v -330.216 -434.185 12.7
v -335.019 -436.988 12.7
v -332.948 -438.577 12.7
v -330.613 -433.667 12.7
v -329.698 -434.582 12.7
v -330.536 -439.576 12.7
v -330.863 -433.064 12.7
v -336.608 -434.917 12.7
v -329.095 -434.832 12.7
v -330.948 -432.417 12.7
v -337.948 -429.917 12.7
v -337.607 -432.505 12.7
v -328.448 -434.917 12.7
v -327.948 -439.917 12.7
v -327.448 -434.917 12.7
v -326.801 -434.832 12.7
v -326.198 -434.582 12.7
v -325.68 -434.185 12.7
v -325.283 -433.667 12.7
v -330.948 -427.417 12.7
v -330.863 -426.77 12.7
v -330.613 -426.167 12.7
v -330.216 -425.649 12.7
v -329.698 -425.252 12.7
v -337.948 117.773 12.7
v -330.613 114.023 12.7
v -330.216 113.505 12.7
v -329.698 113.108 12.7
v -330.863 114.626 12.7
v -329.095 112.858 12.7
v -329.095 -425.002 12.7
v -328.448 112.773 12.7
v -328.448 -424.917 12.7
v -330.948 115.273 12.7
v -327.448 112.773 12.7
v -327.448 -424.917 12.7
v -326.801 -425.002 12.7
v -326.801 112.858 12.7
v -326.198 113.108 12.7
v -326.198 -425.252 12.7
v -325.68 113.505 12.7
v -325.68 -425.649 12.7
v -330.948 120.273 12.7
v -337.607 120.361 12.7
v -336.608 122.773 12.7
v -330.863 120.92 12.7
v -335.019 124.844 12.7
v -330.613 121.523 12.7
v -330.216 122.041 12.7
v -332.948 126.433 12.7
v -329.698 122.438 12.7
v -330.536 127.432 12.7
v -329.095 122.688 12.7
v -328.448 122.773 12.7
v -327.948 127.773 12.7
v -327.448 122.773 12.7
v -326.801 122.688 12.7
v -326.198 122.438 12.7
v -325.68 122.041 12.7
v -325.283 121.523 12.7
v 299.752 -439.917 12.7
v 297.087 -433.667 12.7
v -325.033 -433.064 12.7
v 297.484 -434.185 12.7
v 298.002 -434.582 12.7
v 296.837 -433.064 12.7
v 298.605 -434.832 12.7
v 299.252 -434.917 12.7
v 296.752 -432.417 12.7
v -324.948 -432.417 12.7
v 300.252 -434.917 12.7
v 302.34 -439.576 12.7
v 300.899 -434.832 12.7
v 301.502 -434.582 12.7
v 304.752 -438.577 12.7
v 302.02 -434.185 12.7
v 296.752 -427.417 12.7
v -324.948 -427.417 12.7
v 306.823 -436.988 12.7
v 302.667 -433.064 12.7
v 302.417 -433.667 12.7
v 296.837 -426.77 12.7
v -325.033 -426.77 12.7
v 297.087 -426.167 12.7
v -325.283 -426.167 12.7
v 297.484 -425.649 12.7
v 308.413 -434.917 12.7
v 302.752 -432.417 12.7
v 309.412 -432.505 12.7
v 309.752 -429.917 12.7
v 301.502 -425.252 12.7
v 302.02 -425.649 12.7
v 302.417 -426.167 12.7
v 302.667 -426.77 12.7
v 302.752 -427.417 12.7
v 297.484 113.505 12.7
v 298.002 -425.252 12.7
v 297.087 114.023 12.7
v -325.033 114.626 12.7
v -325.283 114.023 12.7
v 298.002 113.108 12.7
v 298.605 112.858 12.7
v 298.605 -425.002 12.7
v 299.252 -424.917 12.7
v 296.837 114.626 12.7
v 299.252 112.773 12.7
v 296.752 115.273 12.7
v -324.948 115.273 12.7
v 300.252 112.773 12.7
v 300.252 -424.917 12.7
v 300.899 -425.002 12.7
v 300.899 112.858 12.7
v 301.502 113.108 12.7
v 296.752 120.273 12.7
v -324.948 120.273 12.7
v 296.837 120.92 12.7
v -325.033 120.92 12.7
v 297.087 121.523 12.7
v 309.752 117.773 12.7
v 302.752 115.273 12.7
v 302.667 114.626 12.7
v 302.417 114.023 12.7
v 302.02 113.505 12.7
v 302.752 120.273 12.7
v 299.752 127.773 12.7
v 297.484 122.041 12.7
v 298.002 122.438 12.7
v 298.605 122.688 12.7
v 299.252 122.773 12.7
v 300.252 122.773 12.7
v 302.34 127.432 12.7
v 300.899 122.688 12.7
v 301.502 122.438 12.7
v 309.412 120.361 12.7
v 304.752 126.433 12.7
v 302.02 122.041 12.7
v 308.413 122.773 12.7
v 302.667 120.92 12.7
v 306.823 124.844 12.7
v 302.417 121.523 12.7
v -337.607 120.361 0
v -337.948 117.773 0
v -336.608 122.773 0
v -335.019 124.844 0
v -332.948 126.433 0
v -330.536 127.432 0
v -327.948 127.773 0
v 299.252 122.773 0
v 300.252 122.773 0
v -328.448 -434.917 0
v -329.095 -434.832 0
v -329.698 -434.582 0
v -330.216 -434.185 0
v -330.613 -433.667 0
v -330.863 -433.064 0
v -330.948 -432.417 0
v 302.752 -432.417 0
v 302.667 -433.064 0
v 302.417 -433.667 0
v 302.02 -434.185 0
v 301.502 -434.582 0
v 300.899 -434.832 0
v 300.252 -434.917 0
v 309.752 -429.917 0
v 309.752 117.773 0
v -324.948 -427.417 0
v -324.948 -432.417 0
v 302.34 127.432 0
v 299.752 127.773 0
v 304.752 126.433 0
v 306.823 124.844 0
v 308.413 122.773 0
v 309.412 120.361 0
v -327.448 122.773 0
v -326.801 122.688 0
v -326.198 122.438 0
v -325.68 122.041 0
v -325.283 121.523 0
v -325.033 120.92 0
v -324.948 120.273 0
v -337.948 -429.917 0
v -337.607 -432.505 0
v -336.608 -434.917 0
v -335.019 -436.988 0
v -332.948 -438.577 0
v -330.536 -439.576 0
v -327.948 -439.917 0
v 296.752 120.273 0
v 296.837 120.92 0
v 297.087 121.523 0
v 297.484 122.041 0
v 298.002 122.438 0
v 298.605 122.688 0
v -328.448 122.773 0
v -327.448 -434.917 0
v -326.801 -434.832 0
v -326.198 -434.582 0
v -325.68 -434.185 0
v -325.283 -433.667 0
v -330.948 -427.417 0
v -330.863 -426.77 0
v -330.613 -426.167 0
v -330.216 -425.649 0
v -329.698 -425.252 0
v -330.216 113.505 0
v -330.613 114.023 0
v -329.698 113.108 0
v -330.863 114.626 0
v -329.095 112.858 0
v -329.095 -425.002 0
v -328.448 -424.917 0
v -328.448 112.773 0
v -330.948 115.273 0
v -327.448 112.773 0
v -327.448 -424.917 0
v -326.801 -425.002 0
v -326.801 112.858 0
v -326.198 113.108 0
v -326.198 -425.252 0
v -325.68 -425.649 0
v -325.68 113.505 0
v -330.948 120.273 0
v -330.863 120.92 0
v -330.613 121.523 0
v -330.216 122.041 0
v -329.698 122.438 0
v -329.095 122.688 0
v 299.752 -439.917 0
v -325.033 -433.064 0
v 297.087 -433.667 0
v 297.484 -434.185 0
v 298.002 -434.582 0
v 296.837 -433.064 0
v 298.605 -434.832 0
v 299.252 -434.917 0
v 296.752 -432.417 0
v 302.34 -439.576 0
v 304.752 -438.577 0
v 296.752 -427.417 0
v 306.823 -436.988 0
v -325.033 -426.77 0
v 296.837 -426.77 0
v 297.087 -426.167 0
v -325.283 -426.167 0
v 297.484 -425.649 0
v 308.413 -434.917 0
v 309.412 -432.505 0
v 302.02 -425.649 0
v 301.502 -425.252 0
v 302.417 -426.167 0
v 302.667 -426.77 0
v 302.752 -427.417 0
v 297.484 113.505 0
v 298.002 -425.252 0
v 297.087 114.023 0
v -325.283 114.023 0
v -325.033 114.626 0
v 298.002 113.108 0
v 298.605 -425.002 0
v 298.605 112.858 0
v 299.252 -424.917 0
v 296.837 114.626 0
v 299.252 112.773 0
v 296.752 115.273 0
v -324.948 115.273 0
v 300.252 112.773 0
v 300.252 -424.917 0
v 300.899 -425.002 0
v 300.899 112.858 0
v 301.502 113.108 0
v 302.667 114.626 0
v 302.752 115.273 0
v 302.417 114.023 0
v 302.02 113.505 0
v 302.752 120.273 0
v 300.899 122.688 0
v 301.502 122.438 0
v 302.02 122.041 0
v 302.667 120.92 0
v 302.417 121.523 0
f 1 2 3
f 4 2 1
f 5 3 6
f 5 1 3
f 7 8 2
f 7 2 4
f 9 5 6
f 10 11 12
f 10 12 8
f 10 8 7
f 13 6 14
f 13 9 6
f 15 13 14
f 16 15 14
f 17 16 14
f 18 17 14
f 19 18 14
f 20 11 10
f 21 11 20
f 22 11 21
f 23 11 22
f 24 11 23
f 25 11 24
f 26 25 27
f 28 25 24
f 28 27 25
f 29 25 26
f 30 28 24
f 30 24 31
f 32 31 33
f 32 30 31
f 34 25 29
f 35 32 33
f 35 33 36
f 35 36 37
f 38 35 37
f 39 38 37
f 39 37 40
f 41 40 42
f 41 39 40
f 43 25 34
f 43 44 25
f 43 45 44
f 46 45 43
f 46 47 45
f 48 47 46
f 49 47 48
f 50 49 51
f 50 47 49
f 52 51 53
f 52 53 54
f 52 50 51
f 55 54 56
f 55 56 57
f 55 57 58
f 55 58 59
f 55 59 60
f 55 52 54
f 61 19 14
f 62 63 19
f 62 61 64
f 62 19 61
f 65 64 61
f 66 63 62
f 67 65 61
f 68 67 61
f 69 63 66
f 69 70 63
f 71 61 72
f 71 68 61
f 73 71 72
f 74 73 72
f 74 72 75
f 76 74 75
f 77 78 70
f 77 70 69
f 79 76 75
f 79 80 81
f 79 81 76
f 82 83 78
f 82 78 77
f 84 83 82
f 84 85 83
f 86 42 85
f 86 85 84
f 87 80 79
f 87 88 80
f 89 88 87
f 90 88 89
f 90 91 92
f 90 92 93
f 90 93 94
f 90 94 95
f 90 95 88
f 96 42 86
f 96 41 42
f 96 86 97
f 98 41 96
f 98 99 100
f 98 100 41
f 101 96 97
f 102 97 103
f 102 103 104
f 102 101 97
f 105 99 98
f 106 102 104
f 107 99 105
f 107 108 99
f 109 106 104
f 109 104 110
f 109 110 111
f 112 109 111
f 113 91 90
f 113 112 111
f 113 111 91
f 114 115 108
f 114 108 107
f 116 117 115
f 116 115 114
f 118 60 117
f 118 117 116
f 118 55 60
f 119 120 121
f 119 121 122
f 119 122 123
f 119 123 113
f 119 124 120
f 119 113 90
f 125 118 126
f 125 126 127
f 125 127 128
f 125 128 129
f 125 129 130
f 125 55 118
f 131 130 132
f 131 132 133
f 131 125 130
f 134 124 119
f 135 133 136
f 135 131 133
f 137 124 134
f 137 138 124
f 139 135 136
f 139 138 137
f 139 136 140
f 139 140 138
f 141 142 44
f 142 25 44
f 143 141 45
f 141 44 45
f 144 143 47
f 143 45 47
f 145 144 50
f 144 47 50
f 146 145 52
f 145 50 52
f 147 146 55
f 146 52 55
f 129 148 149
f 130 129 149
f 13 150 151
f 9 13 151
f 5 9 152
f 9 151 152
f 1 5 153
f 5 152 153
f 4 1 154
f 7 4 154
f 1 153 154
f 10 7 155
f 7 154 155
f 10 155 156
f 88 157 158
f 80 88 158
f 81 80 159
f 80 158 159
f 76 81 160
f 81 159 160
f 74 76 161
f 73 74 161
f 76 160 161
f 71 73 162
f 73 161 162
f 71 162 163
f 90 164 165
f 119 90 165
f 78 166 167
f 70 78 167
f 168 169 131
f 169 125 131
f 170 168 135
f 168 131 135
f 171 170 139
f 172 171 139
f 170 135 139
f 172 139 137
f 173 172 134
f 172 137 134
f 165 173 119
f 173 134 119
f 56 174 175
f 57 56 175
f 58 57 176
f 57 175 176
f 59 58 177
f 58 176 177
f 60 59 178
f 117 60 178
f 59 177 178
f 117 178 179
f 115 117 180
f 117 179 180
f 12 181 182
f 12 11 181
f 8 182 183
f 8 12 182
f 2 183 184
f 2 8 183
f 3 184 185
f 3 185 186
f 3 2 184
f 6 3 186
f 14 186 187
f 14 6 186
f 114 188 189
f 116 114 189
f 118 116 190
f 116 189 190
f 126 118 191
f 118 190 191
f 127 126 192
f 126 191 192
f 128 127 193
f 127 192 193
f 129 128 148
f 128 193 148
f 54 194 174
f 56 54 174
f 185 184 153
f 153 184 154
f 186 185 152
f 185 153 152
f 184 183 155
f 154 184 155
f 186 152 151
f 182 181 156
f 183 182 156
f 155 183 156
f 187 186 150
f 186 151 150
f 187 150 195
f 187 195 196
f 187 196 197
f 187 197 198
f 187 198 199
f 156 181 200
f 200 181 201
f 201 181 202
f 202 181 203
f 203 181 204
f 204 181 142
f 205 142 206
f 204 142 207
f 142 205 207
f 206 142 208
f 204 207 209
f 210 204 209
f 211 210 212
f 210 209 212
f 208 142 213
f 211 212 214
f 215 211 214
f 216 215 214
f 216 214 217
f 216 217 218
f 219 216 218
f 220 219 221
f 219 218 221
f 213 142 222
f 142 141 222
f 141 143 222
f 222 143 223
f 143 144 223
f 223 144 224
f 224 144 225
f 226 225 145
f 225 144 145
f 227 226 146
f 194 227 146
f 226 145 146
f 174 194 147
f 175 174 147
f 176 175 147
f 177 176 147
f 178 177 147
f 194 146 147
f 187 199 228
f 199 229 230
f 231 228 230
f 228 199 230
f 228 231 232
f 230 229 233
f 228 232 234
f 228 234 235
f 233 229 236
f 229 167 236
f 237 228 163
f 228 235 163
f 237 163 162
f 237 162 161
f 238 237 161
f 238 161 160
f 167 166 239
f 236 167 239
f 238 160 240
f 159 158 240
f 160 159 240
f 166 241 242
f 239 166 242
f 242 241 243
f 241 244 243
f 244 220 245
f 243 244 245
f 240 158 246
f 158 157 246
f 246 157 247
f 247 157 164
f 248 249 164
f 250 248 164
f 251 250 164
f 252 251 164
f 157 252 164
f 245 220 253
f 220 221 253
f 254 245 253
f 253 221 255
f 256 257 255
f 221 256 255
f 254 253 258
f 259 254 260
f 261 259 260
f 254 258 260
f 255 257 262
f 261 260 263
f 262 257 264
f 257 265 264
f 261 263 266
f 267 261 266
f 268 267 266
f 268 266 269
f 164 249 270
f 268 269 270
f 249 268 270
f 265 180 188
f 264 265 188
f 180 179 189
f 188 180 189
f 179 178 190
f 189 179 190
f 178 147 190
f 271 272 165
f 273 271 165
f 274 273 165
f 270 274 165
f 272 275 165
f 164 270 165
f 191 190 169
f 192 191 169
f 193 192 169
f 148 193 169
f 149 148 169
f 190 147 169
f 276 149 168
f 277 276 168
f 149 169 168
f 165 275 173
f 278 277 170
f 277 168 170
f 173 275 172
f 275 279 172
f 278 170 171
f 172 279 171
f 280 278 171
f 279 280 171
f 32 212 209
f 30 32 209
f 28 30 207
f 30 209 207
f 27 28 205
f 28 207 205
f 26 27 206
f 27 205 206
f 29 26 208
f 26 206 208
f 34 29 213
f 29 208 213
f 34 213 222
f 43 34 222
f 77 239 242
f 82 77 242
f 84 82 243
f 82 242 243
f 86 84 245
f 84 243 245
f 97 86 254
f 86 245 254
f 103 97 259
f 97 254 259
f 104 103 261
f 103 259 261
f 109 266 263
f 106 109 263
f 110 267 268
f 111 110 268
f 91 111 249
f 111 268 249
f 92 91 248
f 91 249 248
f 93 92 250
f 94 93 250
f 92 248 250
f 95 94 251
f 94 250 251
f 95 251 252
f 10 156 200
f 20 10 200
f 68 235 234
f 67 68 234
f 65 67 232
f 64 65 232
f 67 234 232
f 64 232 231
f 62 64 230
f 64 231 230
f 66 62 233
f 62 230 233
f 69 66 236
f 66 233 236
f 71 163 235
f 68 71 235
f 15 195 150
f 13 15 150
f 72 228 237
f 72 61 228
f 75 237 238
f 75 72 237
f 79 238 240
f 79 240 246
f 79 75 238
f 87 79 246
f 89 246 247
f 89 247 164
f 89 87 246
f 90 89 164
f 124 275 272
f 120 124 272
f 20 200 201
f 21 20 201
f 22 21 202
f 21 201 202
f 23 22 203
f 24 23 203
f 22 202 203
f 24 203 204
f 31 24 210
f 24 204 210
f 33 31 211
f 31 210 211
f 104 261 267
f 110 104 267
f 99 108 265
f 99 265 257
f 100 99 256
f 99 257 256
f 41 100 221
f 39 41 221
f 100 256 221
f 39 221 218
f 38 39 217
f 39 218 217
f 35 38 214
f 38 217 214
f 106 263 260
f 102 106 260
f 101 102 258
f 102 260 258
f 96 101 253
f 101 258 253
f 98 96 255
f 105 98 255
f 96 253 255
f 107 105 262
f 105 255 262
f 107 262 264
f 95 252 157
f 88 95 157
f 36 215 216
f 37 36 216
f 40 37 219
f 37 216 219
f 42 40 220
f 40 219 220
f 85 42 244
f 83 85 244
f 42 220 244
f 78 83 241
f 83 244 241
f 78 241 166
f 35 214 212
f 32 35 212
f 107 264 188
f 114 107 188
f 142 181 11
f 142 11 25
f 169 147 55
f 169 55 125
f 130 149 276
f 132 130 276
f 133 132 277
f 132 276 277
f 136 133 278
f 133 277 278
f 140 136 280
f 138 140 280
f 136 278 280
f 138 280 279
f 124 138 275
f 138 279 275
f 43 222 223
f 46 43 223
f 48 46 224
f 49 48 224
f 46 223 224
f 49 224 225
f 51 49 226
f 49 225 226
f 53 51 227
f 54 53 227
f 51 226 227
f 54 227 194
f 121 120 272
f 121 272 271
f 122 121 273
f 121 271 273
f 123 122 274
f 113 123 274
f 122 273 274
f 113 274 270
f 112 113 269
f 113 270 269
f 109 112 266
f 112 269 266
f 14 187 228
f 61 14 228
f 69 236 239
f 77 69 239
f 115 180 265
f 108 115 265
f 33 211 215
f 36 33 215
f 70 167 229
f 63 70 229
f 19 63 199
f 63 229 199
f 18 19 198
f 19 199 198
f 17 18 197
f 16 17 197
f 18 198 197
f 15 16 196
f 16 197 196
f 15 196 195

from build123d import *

# Parameters (mm, degrees)
SKETCH1_W           = 647.7
SKETCH1_H           = 567.69
BOSS_EXTRUDE1_DEPTH = 12.7
FILLET1_R           = 10


with BuildPart() as part:
    # Sketch1 → Boss-Extrude1 (new body)
    with BuildSketch(Plane.XY):
        with Locations((-14.097734139, -156.072190332)):
            Rectangle(SKETCH1_W, SKETCH1_H)
        with BuildLine():
            Line((300.252265861, -434.917190332), (299.252265861, -434.917190332))
            ThreePointArc((299.252265861, -434.917190332), (297.484498908, -434.184957285), (296.752265861, -432.417190332))
            Line((296.752265861, -432.417190332), (296.752265861, -427.417190332))
            ThreePointArc((296.752265861, -427.417190332), (297.484498908, -425.649423379), (299.252265861, -424.917190332))
            Line((299.252265861, -424.917190332), (300.252265861, -424.917190332))
            ThreePointArc((300.252265861, -424.917190332), (302.020032814, -425.649423379), (302.752265861, -427.417190332))
            Line((302.752265861, -427.417190332), (302.752265861, -432.417190332))
            ThreePointArc((302.752265861, -432.417190332), (302.020032814, -434.184957285), (300.252265861, -434.917190332))
        make_face(mode=Mode.SUBTRACT)
        with BuildLine():
            Line((-327.447734139, -434.917190332), (-328.447734139, -434.917190332))
            ThreePointArc((-328.447734139, -434.917190332), (-330.215501092, -434.184957285), (-330.947734139, -432.417190332))
            Line((-330.947734139, -432.417190332), (-330.947734139, -427.417190332))
            ThreePointArc((-330.947734139, -427.417190332), (-330.215501092, -425.649423379), (-328.447734139, -424.917190332))
            Line((-328.447734139, -424.917190332), (-327.447734139, -424.917190332))
            ThreePointArc((-327.447734139, -424.917190332), (-325.679967186, -425.649423379), (-324.947734139, -427.417190332))
            Line((-324.947734139, -427.417190332), (-324.947734139, -432.417190332))
            ThreePointArc((-324.947734139, -432.417190332), (-325.679967186, -434.184957285), (-327.447734139, -434.917190332))
        make_face(mode=Mode.SUBTRACT)
        with BuildLine():
            Line((-327.447734139, 112.772809668), (-328.447734139, 112.772809668))
            ThreePointArc((-328.447734139, 112.772809668), (-330.215501092, 113.505042715), (-330.947734139, 115.272809668))
            Line((-330.947734139, 115.272809668), (-330.947734139, 120.272809668))
            ThreePointArc((-330.947734139, 120.272809668), (-330.215501092, 122.040576621), (-328.447734139, 122.772809668))
            Line((-328.447734139, 122.772809668), (-327.447734139, 122.772809668))
            ThreePointArc((-327.447734139, 122.772809668), (-325.679967186, 122.040576621), (-324.947734139, 120.272809668))
            Line((-324.947734139, 120.272809668), (-324.947734139, 115.272809668))
            ThreePointArc((-324.947734139, 115.272809668), (-325.679967186, 113.505042715), (-327.447734139, 112.772809668))
        make_face(mode=Mode.SUBTRACT)
        with BuildLine():
            Line((300.252265861, 112.772809668), (299.252265861, 112.772809668))
            ThreePointArc((299.252265861, 112.772809668), (297.484498908, 113.505042715), (296.752265861, 115.272809668))
            Line((296.752265861, 115.272809668), (296.752265861, 120.272809668))
            ThreePointArc((296.752265861, 120.272809668), (297.484498908, 122.040576621), (299.252265861, 122.772809668))
            Line((299.252265861, 122.772809668), (300.252265861, 122.772809668))
            ThreePointArc((300.252265861, 122.772809668), (302.020032814, 122.040576621), (302.752265861, 120.272809668))
            Line((302.752265861, 120.272809668), (302.752265861, 115.272809668))
            ThreePointArc((302.752265861, 115.272809668), (302.020032814, 113.505042715), (300.252265861, 112.772809668))
        make_face(mode=Mode.SUBTRACT)
    extrude(amount=BOSS_EXTRUDE1_DEPTH)

    # Fillet1
    fillet1_edges = [part.edges().sort_by_distance(p)[0] for p in [
        (-337.947734139, 127.772809668, 6.35),
        (309.752265861, 127.772809668, 6.35),
        (309.752265861, -439.917190332, 6.35),
        (-337.947734139, -439.917190332, 6.35),
    ]]
    fillet(fillet1_edges, radius=FILLET1_R)


solid = part.part
